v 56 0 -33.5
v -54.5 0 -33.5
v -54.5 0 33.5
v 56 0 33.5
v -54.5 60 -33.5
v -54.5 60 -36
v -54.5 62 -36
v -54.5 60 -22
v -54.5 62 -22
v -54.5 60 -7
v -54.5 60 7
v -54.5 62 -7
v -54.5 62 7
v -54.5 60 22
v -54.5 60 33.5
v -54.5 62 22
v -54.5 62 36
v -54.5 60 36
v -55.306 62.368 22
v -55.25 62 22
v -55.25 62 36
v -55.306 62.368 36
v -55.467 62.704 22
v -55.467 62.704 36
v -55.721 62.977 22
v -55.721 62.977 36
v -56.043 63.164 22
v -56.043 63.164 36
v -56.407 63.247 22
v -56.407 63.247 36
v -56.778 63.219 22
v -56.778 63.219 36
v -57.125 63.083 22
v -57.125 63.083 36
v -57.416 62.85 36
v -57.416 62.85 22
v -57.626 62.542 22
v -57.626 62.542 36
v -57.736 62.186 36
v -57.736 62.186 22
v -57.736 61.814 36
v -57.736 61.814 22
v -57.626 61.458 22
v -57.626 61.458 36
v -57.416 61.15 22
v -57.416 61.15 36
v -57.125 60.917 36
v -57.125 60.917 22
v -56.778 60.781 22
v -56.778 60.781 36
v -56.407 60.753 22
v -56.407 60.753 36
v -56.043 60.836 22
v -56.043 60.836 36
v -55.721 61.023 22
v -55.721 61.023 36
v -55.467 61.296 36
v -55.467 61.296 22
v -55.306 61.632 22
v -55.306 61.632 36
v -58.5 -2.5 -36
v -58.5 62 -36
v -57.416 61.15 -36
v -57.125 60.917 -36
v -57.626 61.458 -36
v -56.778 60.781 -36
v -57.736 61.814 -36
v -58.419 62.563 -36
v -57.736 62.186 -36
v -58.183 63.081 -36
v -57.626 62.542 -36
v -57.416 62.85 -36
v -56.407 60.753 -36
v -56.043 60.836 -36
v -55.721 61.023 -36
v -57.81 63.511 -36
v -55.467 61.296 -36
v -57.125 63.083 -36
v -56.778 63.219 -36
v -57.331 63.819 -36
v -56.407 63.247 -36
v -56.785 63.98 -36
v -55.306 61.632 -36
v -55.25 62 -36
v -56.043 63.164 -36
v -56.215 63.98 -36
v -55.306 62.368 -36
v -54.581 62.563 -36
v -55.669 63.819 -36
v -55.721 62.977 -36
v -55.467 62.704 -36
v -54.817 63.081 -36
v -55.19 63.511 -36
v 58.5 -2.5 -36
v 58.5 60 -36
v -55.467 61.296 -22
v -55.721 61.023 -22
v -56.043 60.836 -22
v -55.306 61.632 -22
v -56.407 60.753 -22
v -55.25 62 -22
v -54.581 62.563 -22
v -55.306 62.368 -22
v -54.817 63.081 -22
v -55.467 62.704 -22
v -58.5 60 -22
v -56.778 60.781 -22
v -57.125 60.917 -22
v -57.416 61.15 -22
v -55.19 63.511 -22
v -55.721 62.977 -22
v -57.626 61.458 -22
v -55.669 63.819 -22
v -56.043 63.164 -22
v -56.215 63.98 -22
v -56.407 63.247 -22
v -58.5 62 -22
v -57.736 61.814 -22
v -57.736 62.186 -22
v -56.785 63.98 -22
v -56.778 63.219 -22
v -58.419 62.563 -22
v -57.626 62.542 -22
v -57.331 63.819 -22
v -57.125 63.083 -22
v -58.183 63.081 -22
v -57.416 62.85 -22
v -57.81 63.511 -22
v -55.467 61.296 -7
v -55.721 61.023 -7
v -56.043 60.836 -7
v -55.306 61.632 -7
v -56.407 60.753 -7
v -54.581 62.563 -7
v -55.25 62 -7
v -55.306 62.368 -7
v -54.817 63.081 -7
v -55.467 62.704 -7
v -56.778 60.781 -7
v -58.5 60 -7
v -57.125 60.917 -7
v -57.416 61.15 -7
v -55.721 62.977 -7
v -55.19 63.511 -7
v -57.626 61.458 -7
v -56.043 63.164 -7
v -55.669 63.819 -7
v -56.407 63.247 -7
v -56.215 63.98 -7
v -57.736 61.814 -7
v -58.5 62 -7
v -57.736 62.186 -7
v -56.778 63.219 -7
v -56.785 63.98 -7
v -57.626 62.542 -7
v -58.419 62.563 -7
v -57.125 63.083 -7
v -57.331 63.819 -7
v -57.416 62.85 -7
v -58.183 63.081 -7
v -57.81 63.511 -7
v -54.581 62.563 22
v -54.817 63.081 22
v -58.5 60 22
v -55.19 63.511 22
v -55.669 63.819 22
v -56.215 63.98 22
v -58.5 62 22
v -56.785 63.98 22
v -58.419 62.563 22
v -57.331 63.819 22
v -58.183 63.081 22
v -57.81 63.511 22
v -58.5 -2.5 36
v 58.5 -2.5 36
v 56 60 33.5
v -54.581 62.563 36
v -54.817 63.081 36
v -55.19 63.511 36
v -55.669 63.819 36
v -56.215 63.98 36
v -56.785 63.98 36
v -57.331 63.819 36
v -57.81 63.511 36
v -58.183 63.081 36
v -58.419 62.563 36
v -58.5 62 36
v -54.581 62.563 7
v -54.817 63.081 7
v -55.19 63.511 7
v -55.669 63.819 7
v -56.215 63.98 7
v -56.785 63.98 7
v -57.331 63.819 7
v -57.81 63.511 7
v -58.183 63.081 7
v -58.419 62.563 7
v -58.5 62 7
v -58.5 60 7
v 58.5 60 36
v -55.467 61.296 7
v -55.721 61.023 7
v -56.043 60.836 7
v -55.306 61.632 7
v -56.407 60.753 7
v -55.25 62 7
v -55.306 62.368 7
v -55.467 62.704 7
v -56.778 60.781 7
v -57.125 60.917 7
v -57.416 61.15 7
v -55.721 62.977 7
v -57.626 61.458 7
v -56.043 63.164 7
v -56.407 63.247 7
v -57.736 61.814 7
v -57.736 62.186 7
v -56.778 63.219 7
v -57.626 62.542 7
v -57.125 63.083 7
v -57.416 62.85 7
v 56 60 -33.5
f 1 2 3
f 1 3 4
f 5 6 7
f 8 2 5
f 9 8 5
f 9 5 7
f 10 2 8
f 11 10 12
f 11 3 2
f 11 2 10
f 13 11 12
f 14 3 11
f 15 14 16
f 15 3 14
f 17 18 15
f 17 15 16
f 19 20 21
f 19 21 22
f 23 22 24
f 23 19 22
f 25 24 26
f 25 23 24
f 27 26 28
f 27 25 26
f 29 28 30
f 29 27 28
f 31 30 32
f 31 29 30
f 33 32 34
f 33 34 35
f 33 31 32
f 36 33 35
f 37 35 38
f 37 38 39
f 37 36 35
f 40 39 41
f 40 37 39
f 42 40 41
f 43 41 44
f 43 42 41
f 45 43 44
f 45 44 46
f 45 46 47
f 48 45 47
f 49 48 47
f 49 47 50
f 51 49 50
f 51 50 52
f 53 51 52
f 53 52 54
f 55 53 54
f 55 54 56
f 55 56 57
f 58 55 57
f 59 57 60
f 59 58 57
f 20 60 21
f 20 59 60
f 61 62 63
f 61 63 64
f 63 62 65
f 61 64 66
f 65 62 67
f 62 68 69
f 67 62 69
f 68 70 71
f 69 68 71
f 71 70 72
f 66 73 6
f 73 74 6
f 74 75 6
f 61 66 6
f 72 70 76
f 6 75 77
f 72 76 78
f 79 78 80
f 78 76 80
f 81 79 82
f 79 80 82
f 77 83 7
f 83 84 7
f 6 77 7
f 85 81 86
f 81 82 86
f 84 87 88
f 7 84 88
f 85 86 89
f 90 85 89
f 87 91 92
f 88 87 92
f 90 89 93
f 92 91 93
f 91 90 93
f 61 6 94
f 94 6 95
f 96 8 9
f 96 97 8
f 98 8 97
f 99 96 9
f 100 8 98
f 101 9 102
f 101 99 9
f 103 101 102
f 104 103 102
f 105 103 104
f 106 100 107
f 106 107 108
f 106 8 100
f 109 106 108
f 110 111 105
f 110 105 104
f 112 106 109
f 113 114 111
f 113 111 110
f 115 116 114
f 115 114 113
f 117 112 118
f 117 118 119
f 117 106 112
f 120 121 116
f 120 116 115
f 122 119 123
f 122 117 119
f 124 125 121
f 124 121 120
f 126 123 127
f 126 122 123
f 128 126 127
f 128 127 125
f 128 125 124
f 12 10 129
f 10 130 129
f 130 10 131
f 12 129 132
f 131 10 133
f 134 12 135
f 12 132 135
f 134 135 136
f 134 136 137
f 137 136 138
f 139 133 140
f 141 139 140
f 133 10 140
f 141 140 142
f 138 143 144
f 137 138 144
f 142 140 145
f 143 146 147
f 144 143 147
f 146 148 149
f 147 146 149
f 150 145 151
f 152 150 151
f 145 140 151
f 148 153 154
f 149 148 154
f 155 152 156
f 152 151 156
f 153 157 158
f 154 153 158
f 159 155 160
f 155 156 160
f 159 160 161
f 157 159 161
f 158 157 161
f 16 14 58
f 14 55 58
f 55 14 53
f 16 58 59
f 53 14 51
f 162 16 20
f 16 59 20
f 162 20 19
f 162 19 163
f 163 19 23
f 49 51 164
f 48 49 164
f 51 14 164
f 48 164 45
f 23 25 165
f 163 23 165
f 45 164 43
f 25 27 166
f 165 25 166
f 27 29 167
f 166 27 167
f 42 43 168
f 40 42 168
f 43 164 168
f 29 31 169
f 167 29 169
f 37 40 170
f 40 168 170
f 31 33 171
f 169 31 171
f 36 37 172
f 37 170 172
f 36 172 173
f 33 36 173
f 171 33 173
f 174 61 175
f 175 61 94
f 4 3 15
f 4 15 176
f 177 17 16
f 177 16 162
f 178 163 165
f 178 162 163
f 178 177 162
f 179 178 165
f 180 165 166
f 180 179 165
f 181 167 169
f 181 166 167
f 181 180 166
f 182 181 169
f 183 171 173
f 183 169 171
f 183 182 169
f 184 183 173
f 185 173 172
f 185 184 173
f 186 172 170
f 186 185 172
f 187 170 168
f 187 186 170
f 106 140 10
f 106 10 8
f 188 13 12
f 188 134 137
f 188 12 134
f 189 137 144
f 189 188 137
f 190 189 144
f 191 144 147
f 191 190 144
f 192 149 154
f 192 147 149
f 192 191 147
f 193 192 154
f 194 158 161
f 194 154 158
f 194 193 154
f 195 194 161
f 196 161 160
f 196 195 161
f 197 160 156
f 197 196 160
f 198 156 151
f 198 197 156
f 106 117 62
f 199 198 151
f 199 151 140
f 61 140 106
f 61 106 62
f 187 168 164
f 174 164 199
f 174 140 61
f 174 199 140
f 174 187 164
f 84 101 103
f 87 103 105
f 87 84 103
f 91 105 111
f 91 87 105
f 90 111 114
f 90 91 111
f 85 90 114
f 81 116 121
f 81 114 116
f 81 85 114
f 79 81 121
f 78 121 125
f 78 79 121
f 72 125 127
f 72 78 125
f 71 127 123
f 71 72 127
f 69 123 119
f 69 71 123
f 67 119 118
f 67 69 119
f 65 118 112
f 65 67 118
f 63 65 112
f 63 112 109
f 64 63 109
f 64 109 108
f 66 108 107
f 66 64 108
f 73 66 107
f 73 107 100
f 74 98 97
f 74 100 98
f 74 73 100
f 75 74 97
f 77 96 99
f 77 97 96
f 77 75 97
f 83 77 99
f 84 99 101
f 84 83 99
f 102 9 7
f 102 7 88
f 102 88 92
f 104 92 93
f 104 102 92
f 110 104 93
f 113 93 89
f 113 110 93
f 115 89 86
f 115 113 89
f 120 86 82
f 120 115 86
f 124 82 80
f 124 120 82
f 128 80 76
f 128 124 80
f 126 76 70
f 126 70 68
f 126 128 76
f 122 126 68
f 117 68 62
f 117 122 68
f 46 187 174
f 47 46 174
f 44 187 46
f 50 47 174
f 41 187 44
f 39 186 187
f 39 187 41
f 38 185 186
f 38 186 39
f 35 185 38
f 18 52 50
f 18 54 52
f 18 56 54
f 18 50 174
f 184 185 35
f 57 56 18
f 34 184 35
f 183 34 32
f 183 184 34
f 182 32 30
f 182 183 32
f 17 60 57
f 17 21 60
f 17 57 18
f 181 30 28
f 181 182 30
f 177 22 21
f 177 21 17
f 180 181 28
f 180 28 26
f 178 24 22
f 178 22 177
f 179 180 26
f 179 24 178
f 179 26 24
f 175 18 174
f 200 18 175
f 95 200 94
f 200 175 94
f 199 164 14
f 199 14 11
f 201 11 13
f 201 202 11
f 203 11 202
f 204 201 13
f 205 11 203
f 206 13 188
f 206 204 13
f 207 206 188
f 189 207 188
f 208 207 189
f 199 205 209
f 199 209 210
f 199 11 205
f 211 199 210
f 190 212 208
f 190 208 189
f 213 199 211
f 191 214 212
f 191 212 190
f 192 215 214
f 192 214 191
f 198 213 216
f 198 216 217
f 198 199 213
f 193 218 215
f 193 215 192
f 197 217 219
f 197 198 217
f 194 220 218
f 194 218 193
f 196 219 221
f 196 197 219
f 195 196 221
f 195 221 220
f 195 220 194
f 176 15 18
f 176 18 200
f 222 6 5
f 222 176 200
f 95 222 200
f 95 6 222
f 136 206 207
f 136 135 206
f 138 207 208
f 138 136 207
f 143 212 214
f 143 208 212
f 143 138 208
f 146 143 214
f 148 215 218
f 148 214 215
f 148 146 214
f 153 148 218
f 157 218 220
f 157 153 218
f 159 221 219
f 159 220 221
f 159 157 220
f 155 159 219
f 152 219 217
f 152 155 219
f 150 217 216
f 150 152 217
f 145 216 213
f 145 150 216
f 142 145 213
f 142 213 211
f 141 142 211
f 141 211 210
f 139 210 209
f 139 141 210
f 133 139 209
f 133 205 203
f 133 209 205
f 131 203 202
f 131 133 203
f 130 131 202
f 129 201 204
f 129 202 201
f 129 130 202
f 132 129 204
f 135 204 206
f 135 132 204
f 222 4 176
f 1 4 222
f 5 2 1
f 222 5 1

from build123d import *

# Parameters (mm, degrees)
SKETCH1_W               = 117
SKETCH1_H               = 72
BOSS_EXTRUDE1_DEPTH     = 2.5
SKETCH2_W               = 117
SKETCH2_H               = 72
SKETCH2_W_2             = 110.5
SKETCH2_H_2             = 67
BOSS_EXTRUDE2_DEPTH     = 60
SKETCH3_R               = 1.25
BOSS_EXTRUDE3_DEPTH     = 36
CUT_EXTRUDE1_DEPTH      = 94.884237229
CUT_EXTRUDE1_DEPTH_BACK = 94.884237229
SKETCH4_W               = 15
SKETCH4_H               = 4


with BuildPart() as part:
    # Sketch1 → Boss-Extrude1 (new body)
    with BuildSketch(Plane(origin=(0, 0, 0), x_dir=(1, 0, 0), z_dir=(0, 1, 0))):
        Rectangle(SKETCH1_W, SKETCH1_H)
    extrude(amount=-BOSS_EXTRUDE1_DEPTH)

    # Sketch2 → Boss-Extrude2 (add)
    with BuildSketch(Plane(origin=(0, 0, 0), x_dir=(1, 0, 0), z_dir=(0, 1, 0))):
        Rectangle(SKETCH2_W, SKETCH2_H)
        with Locations((0.75, 0)):
            Rectangle(SKETCH2_W_2, SKETCH2_H_2, mode=Mode.SUBTRACT)
    extrude(amount=BOSS_EXTRUDE2_DEPTH)

    # Sketch3 → Boss-Extrude3 (add, symmetric)
    with BuildSketch(Plane.XY):
        with BuildLine():
            Line((-58.5, 62), (-58.5, 60))
            Line((-58.5, 60), (-54.5, 60))
            Line((-54.5, 60), (-54.5, 62))
            ThreePointArc((-54.5, 62), (-56.5, 64), (-58.5, 62))
        make_face()
        with Locations((-56.5, 62)):
            Circle(SKETCH3_R, mode=Mode.SUBTRACT)
    extrude(amount=BOSS_EXTRUDE3_DEPTH, both=True)

    # Sketch4 → Cut-Extrude1 (cut, two sides: drawn at the far end of the back side and taken through both)
    with BuildSketch(Plane(origin=(0, 0, 0), x_dir=(0, 0, -1), z_dir=(1, 0, 0)).offset(-CUT_EXTRUDE1_DEPTH_BACK)):
        with Locations((-14.5, 62)):
            Rectangle(SKETCH4_W, SKETCH4_H)
        with Locations((14.5, 62)):
            Rectangle(SKETCH4_W, SKETCH4_H)
    extrude(amount=CUT_EXTRUDE1_DEPTH + CUT_EXTRUDE1_DEPTH_BACK, mode=Mode.SUBTRACT)


solid = part.part
